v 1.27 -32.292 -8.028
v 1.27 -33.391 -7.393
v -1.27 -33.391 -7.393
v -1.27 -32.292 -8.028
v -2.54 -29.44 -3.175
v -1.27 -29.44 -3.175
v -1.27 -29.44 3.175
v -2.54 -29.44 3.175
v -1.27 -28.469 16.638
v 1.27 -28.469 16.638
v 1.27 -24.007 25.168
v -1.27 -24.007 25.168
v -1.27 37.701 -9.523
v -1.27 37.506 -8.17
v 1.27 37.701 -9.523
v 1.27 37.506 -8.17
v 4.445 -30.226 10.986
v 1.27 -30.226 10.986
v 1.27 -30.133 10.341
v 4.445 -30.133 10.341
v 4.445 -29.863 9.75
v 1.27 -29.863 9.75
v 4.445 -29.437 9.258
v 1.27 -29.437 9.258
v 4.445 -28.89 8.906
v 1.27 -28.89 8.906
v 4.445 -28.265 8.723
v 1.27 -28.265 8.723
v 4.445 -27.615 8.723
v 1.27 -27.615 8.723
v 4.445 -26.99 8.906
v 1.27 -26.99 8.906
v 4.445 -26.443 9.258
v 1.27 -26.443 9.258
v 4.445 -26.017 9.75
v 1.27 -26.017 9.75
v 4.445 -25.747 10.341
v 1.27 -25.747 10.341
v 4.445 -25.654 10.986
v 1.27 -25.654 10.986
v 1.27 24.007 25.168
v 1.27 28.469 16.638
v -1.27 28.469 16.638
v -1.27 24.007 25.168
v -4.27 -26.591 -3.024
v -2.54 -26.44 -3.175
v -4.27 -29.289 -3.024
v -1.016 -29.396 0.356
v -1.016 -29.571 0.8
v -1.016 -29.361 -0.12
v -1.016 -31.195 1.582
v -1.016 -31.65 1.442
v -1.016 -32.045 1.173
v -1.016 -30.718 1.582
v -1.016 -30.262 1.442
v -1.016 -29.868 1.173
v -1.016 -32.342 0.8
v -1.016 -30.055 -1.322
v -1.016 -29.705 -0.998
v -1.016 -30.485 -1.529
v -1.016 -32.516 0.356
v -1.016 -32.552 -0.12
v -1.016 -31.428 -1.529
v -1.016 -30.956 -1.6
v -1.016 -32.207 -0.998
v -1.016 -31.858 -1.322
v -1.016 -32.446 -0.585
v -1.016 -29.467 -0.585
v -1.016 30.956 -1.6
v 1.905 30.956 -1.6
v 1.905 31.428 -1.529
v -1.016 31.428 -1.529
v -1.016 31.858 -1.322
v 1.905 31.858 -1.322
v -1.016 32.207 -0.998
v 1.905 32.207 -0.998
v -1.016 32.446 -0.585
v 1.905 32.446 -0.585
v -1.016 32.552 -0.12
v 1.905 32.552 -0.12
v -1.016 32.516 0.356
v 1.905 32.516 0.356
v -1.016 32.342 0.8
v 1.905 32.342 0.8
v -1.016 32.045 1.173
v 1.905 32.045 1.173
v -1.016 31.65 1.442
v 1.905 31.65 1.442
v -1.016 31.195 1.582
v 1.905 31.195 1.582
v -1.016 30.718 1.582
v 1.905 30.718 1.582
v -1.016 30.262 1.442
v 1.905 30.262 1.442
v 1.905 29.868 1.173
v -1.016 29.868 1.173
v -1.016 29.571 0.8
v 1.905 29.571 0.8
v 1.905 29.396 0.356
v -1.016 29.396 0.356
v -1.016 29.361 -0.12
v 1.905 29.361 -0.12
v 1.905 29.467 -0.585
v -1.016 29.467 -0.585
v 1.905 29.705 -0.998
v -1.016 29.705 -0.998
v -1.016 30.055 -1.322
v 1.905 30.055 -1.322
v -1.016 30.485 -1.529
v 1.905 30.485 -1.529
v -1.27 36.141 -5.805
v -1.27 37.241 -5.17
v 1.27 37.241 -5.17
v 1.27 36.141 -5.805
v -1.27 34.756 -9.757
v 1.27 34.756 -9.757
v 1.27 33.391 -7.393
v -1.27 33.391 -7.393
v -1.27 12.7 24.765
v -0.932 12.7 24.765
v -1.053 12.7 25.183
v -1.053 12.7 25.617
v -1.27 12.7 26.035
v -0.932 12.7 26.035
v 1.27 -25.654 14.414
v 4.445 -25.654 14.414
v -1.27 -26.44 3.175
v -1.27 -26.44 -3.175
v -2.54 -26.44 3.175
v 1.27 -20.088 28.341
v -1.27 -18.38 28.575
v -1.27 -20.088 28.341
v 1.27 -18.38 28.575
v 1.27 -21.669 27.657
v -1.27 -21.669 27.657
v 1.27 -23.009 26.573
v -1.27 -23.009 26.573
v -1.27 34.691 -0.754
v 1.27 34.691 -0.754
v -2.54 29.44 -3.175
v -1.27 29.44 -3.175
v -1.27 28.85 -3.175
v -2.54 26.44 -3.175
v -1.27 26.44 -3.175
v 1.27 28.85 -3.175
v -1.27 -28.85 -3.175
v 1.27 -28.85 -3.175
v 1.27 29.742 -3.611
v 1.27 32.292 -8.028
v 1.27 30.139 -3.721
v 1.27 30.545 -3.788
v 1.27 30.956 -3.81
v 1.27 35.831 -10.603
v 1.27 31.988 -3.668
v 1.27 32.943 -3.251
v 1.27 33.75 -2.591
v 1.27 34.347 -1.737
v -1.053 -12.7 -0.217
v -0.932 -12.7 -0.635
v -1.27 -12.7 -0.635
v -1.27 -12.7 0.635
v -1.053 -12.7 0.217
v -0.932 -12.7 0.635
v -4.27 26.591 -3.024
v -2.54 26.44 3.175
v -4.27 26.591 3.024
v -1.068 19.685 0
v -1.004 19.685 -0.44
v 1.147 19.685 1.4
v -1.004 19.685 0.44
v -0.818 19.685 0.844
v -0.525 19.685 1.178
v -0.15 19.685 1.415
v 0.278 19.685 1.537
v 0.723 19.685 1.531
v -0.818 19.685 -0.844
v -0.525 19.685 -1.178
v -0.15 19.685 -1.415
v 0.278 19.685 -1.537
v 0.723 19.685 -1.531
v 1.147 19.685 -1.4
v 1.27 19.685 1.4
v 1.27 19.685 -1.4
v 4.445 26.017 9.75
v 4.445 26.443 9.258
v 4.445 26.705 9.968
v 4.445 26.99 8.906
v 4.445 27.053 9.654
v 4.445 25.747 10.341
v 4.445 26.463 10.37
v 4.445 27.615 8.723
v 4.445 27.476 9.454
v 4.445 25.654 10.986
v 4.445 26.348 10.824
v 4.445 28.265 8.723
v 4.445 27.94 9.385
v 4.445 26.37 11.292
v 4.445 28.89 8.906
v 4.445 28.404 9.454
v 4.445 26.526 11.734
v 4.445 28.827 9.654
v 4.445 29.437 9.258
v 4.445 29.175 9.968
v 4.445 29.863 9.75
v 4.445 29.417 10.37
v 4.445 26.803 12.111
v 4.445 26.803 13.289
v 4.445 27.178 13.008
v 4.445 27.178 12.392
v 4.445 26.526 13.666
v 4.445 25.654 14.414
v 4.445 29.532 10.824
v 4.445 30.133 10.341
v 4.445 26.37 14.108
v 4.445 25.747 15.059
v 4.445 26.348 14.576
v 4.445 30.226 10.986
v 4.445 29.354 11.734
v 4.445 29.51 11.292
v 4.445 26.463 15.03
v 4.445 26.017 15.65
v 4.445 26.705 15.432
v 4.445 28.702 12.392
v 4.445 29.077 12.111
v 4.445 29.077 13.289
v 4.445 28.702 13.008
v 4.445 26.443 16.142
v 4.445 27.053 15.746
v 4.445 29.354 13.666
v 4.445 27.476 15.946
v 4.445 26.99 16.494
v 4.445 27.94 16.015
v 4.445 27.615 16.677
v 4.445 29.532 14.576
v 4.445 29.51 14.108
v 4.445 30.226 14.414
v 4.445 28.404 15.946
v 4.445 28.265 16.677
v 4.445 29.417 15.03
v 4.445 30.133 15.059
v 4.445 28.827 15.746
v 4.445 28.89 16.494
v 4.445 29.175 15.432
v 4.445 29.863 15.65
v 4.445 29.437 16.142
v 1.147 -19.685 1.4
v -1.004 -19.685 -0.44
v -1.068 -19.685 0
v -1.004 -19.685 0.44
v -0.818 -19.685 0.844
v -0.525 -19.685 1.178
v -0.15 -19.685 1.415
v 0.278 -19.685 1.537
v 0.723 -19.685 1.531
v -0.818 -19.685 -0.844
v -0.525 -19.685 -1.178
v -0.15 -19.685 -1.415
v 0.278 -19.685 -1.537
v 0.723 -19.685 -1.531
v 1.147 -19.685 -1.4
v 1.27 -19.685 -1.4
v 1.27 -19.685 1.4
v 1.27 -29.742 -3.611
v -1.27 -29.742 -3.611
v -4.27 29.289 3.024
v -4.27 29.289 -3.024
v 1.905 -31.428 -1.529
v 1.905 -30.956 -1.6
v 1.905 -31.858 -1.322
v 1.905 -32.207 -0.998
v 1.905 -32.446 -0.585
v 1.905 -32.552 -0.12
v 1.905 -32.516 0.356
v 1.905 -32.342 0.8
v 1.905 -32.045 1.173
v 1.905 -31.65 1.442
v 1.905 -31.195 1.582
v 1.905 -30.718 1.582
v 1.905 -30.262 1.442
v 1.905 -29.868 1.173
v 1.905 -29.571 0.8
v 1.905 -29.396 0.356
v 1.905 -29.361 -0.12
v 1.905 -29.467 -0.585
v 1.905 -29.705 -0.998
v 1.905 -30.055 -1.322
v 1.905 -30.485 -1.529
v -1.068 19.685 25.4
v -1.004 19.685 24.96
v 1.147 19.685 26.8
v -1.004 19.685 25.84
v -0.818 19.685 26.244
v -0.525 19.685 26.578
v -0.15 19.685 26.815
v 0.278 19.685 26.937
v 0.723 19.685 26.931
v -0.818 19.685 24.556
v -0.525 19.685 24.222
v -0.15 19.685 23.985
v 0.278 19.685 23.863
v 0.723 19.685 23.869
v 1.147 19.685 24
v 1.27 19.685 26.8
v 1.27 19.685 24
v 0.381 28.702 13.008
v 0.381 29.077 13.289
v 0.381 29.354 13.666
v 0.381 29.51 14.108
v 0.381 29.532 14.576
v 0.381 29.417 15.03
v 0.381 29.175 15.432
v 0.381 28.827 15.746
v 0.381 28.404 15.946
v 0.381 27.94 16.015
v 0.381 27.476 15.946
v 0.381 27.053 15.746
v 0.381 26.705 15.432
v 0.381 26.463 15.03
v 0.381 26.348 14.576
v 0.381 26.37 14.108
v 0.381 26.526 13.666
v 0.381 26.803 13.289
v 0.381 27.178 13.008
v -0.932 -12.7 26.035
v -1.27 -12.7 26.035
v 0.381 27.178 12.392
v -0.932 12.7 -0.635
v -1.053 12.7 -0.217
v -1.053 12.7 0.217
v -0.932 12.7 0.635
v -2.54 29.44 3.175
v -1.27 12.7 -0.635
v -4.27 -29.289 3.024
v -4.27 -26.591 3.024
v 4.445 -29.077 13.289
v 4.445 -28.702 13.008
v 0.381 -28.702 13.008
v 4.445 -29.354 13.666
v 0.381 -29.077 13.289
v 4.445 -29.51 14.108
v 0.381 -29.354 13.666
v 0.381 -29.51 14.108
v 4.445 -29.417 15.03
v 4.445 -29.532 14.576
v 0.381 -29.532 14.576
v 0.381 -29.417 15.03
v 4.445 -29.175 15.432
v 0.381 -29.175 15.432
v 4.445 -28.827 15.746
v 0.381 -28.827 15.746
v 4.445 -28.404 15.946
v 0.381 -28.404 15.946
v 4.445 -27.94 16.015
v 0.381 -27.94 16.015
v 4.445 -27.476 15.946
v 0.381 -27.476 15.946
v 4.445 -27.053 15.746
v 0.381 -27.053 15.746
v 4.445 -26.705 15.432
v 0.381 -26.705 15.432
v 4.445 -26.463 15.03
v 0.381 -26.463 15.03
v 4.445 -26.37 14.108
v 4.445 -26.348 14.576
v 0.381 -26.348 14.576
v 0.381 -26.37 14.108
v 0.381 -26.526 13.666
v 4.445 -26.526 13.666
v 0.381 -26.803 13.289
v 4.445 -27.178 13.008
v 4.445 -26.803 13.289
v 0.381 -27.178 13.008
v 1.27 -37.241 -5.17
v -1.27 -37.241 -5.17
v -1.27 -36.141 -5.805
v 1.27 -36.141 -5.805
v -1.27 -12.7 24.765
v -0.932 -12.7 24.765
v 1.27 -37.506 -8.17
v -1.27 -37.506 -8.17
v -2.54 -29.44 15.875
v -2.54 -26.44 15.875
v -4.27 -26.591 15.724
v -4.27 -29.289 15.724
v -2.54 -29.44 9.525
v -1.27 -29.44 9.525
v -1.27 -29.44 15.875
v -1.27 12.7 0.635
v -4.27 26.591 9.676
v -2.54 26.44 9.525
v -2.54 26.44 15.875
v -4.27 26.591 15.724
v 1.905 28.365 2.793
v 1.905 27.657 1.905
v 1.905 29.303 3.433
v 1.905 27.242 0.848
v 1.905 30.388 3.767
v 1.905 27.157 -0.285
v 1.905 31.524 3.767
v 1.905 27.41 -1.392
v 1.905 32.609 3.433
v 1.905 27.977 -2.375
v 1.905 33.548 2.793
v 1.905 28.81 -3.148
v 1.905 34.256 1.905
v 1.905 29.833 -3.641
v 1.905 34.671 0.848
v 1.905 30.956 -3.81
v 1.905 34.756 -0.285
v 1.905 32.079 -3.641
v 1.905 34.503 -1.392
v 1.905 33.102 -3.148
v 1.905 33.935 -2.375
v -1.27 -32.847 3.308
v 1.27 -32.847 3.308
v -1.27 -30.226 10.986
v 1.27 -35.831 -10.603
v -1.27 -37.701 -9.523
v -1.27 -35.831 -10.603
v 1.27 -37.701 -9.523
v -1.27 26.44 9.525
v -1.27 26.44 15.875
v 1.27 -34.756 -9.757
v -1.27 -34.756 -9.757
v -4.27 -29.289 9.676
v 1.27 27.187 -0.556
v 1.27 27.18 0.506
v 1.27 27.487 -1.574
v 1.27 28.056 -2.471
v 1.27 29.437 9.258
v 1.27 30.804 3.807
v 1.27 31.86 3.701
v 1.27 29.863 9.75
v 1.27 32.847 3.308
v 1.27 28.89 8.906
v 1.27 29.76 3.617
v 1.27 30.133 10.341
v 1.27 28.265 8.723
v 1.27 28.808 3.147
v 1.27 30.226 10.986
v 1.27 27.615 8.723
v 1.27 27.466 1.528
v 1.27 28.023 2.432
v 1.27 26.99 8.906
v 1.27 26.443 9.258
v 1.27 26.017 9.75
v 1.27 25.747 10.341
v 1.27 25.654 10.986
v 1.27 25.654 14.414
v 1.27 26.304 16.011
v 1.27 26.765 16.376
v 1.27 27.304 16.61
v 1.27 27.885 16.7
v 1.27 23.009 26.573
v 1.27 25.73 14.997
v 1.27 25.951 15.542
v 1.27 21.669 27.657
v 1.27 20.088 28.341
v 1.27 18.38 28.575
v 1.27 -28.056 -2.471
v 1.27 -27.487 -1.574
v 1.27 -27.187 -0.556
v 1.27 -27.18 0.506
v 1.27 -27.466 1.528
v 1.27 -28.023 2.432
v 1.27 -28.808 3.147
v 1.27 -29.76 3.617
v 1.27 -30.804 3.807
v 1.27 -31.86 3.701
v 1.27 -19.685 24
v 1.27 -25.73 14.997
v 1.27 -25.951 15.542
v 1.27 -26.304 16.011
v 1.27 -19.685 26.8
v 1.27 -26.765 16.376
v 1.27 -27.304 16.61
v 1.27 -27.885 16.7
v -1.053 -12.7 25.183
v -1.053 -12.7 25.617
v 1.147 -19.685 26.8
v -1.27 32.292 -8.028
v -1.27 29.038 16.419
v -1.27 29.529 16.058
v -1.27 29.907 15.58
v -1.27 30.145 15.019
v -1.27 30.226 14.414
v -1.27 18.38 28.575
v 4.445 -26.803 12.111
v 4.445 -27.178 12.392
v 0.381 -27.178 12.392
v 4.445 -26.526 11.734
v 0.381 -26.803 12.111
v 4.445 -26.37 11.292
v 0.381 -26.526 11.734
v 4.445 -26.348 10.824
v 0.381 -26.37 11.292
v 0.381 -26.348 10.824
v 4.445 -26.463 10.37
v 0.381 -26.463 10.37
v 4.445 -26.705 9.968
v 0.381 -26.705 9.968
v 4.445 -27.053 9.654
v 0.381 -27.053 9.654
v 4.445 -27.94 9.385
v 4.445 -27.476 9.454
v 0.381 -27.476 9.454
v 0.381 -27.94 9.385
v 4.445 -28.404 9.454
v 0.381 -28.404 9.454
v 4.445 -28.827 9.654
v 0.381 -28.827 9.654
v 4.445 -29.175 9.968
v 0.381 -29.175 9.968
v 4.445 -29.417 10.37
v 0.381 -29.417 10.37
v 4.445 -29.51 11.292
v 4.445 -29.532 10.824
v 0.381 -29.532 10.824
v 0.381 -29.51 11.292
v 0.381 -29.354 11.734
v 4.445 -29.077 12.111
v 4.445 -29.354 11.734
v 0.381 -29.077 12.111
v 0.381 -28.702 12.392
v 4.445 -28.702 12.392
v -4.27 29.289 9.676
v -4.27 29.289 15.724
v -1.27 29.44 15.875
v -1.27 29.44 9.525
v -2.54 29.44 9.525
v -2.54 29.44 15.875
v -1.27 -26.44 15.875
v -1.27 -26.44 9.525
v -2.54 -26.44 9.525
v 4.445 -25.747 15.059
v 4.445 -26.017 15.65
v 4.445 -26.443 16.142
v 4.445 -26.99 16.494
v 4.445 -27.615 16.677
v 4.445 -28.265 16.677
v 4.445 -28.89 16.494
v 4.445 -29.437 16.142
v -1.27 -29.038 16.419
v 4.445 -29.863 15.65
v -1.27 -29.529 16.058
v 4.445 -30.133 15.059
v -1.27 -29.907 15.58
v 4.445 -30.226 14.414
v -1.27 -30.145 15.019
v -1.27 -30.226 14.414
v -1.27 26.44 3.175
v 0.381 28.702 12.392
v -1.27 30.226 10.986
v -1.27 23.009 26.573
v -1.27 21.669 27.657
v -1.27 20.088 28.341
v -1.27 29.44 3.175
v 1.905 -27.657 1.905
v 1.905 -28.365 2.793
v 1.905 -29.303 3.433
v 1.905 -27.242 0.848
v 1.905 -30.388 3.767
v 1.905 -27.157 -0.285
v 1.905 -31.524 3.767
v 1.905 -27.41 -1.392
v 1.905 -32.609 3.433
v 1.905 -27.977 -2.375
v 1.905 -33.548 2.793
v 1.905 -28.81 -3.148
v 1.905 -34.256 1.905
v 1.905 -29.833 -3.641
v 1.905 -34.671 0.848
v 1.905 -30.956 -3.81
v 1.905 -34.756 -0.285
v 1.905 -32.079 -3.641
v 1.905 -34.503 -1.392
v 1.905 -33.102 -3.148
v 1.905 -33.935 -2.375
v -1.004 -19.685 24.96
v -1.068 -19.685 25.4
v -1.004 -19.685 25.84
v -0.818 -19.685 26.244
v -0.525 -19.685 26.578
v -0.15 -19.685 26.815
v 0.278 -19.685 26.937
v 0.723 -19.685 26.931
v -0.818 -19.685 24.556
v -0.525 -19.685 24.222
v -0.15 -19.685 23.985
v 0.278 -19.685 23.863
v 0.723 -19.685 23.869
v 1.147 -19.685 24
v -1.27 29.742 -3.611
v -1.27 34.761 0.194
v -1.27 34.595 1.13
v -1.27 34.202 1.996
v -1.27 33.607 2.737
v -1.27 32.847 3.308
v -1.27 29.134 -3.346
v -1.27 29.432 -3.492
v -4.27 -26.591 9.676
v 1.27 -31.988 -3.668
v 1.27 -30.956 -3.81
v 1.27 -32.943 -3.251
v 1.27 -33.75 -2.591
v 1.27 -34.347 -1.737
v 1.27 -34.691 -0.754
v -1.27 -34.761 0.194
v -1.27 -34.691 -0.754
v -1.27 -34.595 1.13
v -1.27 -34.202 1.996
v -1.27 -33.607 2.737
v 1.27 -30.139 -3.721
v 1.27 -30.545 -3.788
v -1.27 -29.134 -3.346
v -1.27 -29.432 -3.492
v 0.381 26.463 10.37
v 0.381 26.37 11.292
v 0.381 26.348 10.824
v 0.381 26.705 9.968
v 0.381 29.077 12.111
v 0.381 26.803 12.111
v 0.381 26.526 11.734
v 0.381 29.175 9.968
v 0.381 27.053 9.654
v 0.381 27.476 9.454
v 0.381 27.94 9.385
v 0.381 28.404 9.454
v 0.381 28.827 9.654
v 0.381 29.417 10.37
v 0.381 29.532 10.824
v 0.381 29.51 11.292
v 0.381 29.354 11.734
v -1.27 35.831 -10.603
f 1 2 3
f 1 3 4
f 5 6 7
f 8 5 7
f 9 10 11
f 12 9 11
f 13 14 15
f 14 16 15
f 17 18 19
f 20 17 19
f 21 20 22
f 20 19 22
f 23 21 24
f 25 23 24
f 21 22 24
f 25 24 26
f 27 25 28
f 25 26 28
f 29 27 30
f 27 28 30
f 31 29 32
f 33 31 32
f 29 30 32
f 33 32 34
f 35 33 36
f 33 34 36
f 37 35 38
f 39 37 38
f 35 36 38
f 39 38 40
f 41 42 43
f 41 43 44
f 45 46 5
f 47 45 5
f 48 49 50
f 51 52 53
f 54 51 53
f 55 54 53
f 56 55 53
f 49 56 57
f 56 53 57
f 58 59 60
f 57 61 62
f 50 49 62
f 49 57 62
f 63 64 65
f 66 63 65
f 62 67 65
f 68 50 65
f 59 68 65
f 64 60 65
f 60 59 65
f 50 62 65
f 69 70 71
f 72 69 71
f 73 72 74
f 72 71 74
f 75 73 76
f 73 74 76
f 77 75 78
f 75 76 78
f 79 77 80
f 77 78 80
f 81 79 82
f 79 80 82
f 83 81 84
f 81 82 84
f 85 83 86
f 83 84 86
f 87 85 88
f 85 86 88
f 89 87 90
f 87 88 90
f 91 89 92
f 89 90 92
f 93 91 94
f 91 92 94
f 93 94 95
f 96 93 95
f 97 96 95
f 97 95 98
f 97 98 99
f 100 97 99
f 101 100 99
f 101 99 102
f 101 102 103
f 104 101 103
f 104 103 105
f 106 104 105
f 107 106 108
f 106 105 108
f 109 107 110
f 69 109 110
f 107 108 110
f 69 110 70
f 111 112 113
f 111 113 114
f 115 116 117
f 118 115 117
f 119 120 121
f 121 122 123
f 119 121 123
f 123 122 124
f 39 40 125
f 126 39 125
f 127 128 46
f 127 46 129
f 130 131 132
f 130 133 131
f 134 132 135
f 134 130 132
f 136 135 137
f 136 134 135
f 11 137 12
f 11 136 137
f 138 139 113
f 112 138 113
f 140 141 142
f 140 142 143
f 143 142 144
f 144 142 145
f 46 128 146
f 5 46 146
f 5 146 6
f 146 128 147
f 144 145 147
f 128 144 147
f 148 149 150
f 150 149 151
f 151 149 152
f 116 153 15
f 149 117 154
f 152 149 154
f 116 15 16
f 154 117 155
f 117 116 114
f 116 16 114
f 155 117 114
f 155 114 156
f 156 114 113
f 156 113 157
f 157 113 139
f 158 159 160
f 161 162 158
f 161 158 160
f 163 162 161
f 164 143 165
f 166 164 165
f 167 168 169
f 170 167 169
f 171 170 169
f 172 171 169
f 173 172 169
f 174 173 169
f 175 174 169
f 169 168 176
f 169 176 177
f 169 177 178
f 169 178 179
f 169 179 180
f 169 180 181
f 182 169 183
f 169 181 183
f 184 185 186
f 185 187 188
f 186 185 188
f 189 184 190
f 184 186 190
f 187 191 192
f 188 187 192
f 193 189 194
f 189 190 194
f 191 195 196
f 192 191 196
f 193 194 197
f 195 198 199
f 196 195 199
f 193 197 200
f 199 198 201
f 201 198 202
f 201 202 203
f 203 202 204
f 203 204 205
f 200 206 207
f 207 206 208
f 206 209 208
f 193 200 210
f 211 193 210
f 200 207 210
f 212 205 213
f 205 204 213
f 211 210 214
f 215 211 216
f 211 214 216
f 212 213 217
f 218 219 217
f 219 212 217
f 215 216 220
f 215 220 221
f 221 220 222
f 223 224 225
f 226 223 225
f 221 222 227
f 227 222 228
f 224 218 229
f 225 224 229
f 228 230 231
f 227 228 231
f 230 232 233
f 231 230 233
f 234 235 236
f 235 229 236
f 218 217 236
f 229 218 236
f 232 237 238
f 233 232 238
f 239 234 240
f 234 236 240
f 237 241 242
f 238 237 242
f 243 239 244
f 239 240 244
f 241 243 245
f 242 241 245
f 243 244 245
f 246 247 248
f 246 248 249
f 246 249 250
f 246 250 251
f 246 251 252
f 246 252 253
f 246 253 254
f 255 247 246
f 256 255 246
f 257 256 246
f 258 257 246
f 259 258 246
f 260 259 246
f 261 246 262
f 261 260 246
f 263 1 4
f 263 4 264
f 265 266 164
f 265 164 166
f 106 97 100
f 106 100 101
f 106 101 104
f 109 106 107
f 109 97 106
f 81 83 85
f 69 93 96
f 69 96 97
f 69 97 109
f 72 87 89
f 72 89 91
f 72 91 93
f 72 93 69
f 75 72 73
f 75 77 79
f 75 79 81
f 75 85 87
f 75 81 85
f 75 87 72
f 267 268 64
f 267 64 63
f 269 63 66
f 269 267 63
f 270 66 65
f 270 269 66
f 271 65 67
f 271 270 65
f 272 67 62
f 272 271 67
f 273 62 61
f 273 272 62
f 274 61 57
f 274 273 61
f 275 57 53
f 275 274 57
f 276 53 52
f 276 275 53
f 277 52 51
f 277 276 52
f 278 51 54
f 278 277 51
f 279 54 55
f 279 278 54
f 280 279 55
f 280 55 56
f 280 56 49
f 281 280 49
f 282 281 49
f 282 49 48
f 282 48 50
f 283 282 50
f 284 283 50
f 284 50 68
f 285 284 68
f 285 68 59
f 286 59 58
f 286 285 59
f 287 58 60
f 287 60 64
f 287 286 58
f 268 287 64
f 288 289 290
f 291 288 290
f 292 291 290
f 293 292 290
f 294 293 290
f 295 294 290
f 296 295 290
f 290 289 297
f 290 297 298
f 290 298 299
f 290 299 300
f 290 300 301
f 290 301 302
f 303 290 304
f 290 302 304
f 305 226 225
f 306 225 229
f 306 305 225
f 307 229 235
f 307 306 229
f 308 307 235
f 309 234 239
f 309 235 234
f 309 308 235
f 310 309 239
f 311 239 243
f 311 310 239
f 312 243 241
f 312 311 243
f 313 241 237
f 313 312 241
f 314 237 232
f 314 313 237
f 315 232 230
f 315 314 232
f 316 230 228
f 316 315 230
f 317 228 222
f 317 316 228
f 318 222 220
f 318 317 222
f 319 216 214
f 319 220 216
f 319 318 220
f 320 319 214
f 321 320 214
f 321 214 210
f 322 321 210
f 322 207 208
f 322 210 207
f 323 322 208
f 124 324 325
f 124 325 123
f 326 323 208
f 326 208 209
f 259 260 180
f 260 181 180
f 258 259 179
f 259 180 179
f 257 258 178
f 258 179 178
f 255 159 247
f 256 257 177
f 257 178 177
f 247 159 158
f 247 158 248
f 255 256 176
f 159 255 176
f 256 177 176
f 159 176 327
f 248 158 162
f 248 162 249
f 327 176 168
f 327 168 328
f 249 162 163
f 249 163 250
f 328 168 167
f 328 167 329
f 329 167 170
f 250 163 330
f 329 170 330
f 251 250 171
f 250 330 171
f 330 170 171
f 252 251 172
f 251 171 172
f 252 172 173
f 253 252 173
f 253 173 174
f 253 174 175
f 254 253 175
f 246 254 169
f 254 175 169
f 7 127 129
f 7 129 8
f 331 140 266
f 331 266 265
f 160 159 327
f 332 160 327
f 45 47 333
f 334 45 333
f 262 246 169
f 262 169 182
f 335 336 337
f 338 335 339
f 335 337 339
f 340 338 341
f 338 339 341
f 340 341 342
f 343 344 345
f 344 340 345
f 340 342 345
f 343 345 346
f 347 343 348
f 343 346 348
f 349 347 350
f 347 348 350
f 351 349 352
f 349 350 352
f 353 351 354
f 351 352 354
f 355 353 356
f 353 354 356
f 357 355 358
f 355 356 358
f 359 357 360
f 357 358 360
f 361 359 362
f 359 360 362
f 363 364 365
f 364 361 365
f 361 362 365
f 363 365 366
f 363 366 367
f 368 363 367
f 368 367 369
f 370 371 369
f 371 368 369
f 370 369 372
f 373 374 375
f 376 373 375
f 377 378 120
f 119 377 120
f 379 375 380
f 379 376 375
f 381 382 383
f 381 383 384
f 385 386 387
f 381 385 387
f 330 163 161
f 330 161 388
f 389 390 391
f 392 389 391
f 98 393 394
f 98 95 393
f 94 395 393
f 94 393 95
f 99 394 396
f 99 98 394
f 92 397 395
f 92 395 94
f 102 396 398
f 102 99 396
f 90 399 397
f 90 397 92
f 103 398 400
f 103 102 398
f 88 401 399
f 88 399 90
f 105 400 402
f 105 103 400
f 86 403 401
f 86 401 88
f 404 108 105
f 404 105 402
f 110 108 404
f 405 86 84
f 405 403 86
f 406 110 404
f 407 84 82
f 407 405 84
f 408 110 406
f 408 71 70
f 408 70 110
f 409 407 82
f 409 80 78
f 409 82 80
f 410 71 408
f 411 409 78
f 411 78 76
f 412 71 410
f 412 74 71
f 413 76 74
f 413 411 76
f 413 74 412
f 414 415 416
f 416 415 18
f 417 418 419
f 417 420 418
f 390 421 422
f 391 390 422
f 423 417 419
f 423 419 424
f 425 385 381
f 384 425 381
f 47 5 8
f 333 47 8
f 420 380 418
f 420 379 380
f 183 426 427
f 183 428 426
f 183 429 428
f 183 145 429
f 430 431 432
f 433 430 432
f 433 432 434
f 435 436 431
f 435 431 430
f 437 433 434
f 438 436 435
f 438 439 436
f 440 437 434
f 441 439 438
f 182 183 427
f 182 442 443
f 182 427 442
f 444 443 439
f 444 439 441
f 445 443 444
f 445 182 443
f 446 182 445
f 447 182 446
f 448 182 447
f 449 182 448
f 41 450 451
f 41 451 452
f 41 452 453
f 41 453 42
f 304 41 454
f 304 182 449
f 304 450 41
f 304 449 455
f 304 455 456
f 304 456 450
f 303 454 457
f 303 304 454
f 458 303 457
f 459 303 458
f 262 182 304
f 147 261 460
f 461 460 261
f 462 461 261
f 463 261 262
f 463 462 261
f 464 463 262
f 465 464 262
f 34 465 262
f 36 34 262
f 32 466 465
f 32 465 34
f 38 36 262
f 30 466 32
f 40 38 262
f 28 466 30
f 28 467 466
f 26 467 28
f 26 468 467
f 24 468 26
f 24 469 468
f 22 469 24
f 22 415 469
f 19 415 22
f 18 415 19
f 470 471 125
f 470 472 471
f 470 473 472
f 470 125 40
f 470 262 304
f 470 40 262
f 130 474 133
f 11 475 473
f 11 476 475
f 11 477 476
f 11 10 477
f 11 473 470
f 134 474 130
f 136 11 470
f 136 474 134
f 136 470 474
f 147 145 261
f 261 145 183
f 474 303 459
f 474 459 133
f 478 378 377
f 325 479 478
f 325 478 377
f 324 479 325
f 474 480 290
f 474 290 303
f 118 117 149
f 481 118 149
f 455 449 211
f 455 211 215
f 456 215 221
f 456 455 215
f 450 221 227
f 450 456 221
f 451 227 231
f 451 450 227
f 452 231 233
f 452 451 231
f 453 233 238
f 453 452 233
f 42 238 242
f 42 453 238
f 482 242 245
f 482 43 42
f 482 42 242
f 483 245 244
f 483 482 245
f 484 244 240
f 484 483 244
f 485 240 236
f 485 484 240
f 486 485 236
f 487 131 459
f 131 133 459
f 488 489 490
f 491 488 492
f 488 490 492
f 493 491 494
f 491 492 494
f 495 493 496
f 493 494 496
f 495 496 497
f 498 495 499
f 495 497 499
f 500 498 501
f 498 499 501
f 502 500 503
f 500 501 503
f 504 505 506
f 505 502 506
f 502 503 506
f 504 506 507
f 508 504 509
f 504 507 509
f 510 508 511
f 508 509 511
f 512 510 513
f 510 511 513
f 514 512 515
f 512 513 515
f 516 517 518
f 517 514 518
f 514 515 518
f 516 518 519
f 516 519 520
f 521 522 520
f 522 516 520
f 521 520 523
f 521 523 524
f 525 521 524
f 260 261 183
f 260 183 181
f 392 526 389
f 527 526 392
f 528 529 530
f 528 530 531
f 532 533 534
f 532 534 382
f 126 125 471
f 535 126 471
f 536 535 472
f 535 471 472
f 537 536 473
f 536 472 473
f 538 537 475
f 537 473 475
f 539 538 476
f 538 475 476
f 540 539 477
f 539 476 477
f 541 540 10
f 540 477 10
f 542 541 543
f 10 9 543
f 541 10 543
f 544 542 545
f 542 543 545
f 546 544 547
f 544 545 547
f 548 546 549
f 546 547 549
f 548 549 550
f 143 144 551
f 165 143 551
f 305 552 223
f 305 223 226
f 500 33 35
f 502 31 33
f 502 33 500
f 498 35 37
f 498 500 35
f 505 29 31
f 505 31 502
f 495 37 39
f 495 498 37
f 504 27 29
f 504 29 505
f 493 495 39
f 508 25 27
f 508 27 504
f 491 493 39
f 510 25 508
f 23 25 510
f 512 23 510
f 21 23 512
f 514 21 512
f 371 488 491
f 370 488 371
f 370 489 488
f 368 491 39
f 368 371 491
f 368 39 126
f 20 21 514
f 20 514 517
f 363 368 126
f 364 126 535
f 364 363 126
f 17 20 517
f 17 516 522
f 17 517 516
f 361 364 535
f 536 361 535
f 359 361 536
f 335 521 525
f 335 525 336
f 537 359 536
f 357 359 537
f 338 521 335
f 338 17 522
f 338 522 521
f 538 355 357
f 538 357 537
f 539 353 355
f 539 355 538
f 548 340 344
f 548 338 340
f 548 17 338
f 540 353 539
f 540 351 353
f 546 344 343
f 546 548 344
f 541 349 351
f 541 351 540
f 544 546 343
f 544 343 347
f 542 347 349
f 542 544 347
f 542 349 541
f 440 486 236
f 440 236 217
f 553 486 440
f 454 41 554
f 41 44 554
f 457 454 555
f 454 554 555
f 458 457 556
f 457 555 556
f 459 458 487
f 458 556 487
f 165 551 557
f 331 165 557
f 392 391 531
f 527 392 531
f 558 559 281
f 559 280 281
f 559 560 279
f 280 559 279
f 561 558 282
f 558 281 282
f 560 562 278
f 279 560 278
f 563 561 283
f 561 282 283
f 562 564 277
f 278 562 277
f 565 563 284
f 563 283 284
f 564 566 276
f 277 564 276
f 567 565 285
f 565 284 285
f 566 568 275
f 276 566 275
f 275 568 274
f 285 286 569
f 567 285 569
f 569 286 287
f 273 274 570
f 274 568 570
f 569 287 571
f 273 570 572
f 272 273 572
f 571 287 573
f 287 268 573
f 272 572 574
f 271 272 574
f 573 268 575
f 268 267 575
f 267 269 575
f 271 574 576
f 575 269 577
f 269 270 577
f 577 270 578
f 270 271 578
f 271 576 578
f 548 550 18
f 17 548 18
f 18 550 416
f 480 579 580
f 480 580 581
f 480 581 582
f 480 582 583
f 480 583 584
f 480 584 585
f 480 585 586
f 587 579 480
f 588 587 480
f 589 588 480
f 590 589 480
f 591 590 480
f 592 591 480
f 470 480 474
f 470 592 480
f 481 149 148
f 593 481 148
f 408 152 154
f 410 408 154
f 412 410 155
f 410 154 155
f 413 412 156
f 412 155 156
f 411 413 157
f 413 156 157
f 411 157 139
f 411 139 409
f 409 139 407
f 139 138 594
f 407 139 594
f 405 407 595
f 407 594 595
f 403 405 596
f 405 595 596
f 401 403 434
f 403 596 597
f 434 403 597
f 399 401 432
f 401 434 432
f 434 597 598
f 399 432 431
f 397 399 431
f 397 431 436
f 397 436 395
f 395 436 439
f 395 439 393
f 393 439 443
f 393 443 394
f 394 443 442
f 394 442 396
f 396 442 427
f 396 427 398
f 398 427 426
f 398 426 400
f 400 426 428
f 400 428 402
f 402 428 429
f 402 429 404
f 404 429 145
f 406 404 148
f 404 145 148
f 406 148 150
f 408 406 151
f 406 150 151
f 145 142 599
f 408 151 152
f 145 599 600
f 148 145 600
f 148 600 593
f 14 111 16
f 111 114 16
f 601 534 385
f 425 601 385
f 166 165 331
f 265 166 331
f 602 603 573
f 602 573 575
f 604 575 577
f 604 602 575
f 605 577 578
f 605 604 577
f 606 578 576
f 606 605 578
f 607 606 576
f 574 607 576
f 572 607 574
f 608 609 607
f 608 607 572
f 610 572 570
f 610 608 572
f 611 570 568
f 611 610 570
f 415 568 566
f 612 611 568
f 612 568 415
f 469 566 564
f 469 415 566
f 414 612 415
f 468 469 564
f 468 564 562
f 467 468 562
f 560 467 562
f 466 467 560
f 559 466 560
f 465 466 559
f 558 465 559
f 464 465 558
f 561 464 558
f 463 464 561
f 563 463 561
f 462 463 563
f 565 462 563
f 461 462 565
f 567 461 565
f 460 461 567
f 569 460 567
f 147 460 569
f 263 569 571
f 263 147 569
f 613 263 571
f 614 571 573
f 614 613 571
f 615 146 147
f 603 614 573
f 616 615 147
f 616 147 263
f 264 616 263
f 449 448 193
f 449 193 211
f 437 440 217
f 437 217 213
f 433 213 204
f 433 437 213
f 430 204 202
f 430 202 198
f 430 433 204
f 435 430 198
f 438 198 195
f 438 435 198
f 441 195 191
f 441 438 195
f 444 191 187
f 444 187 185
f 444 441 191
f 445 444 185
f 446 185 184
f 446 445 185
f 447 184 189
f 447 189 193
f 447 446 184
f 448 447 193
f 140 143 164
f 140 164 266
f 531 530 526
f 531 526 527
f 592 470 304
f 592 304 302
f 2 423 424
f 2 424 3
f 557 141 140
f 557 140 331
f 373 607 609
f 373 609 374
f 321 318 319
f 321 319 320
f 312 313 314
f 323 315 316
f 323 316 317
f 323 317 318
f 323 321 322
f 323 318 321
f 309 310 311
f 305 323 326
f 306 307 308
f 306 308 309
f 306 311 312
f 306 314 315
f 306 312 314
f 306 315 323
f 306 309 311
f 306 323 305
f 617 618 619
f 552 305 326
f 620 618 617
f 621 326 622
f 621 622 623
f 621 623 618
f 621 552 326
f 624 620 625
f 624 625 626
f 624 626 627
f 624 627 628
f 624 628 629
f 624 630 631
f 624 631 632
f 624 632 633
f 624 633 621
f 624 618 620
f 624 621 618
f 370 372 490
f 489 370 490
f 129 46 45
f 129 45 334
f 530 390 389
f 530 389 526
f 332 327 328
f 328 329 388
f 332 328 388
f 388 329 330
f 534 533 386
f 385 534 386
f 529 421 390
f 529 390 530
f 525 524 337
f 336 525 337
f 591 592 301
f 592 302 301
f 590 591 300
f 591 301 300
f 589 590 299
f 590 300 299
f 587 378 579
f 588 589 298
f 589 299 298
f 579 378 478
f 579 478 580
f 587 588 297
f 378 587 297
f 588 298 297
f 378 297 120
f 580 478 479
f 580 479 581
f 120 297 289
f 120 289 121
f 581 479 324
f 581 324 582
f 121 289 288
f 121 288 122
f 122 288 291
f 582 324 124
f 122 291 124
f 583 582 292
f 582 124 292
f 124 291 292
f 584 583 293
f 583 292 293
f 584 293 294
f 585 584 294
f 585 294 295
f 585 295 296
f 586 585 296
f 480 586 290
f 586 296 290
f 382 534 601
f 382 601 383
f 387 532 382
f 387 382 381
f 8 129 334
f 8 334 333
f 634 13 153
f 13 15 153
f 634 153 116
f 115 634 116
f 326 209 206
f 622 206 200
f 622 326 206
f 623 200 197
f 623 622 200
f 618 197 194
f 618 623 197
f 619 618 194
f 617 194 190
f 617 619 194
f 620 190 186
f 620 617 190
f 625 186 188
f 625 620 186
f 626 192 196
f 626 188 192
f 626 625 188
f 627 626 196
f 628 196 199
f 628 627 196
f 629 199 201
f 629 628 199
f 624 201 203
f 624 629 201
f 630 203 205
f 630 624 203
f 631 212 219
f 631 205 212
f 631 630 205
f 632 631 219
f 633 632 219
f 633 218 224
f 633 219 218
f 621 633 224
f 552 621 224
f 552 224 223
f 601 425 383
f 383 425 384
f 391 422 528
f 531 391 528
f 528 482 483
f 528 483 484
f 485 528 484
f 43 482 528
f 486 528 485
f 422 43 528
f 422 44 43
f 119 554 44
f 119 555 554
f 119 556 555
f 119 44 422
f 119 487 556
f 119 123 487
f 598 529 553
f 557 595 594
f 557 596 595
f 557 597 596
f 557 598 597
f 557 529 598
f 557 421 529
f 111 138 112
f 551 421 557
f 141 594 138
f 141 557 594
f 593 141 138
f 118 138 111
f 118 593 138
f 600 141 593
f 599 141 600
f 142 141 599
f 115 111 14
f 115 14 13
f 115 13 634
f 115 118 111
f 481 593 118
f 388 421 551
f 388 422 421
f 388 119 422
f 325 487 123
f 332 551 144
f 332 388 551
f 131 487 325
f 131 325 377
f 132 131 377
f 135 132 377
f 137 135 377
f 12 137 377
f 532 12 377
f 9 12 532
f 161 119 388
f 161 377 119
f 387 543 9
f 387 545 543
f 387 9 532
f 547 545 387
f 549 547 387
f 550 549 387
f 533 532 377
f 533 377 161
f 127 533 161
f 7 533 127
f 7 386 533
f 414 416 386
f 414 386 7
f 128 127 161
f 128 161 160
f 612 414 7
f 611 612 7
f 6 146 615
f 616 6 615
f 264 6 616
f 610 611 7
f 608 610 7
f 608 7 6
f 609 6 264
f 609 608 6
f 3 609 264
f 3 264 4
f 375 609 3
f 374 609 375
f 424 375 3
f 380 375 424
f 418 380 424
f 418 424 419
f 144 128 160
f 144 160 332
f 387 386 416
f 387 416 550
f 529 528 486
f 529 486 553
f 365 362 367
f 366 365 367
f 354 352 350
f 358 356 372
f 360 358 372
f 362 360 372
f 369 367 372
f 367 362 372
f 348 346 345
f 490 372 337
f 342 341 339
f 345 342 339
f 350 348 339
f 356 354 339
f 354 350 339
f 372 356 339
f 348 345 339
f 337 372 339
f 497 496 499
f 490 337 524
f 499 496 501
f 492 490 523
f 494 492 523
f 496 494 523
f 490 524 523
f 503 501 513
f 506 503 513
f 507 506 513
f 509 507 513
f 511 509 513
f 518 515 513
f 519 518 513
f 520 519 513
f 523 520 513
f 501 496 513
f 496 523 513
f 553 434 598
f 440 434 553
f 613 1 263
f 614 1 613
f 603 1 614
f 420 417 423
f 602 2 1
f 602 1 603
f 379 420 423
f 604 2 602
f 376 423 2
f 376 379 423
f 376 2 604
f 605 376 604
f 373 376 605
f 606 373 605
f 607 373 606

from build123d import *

# Parameters (mm, degrees)
DOWELSUPPORT_DEPTH          = 1.905
DOWELSUPPORT_DEPTH_BACK     = 1.27
SKETCH3_R                   = 3.81
SKETCH5_W                   = 6.35
SKETCH5_H                   = 44.45
SLIDERDOWELSUPPORT_DEPTH    = 1.27
SKETCH17_R                  = 1.549999948
CUT_EXTRUDE1_DEPTH          = 19.685
CUT_EXTRUDE2_DEPTH          = 36.118212712
CUT_EXTRUDE2_DEPTH_BACK     = 36.118212712
SKETCH18_W                  = 1.27
SKETCH18_H                  = 25.4
LPATTERN1_COUNT             = 2
LPATTERN1_PITCH             = 25.4
LATERALSUPPORT_DEPTH        = 1.27
SKETCH8_W                   = 6.35
SKETCH8_H                   = 3
TABSUPPORT_DEPTH            = 1.27
STRINGDOWELSUPPORT_START    = -1.27
STRINGDOWELSUPPORT_DEPTH    = 5.715
INTERSUPPORT_DEPTH          = 1.27
SKETCH10_W                  = 6.35
SKETCH10_H                  = 3
TABBASE_DEPTH               = 1.27
SKETCH12_W                  = 6.35
SKETCH12_H                  = 3
TABDRAFT_DEPTH              = 1.73
TABDRAFT_DRAFT              = 5
TABDRAFT_PROFILE_2_DEPTH    = 1.73
TABDRAFT_PROFILE_2_DRAFT    = 5
STRINGDOWELHOLES_DEPTH      = 48.707819409
STRINGDOWELHOLES_DEPTH_BACK = 1.524
SKETCH14_R                  = 1.600000102
PULLEYDOWELHOLE_DEPTH       = 2.921
FILLET1_R                   = 6.35


with BuildPart() as part:
    # Sketch3 → DowelSupport (new, two sides: drawn at the far end of the back side and taken through both)
    with BuildSketch(Plane(origin=(0, 0, 0), x_dir=(0, 0, -1), z_dir=(1, 0, 0)).offset(-DOWELSUPPORT_DEPTH_BACK)):
        with Locations((0, 30.95625)):
            Circle(SKETCH3_R)
    extrude(amount=DOWELSUPPORT_DEPTH + DOWELSUPPORT_DEPTH_BACK)

    # Sketch8 → TabSupport (add, symmetric)
    with BuildSketch(Plane(origin=(0, 0, 0), x_dir=(0, 0, -1), z_dir=(1, 0, 0))):
        with Locations((0, 27.94)):
            Rectangle(SKETCH8_W, SKETCH8_H)
        with Locations((-12.7, 27.94)):
            Rectangle(SKETCH8_W, SKETCH8_H)
    extrude(amount=TABSUPPORT_DEPTH, both=True)


with BuildPart() as body_2:
    # Sketch5 → SliderDowelSupport (new, symmetric)
    with BuildSketch(Plane(origin=(0, 0, 0), x_dir=(0, 0, -1), z_dir=(1, 0, 0))):
        Rectangle(SKETCH5_W, SKETCH5_H)
    extrude(amount=SLIDERDOWELSUPPORT_DEPTH, both=True)

    # Sketch17 → Cut-Extrude1 (cut, symmetric)
    with BuildSketch(Plane(origin=(0, 0, 0), x_dir=(1, 0, 0), z_dir=(0, 1, 0))):
        with Locations((0.482000052, 0)):
            Circle(SKETCH17_R)
        with BuildLine():
            Line((2.032, 0), (2.032, 1.399999994))
            Line((2.032, 1.399999994), (1.147206678, 1.399999994))
            ThreePointArc((1.147206678, 1.399999994), (1.792261491, 0.828078983), (2.032, 0))
        make_face()
        with BuildLine():
            Line((2.032, -1.399999994), (2.032, 0))
            ThreePointArc((2.032, 0), (1.792261491, -0.828078983), (1.147206678, -1.399999994))
            Line((1.147206678, -1.399999994), (2.032, -1.399999994))
        make_face()
    extrude(amount=CUT_EXTRUDE1_DEPTH, both=True, mode=Mode.SUBTRACT)

    # Sketch18 → Cut-Extrude2 (cut, two sides: drawn at the far end of the back side and taken through both)
    with BuildSketch(Plane.ZY.offset(1.27).offset(-CUT_EXTRUDE2_DEPTH_BACK)):
        Rectangle(SKETCH18_W, SKETCH18_H)
    extrude(amount=CUT_EXTRUDE2_DEPTH + CUT_EXTRUDE2_DEPTH_BACK, mode=Mode.SUBTRACT)


with BuildPart() as lpattern1_1:
    # LPattern1: pattern copy
    add(body_2.part.moved(Location(Vector(0, 0, 1) * (1 * LPATTERN1_PITCH))))


with BuildPart() as body_4:
    # Sketch6 → LateralSupport (new, symmetric)
    with BuildSketch(Plane(origin=(0, 0, 0), x_dir=(0, 0, -1), z_dir=(1, 0, 0))):
        Polygon((7.392863577, 33.391434671), (5.805363577, 36.141065329), (8.169612929, 37.506065329), (9.523465192, 37.701124423), (10.602965192, 35.831375577), (9.757112929, 34.756434671), align=None)
    extrude(amount=LATERALSUPPORT_DEPTH, both=True)


with BuildPart() as tabsupport_piece_1:
    # of the separate pieces the step leaves, piece 1, a body of its own (tabsupport_pieces)
    add(part.part.solids().sort_by_distance((0, 30.95625, -3.81))[0])


with BuildPart() as tabsupport_piece_2:
    # of the separate pieces the step leaves, piece 2, a body of its own (tabsupport_pieces)
    add(part.part.solids().sort_by_distance((-1.27, 26.44, 9.525))[0])

    # Sketch15 → StringDowelSupport (add)
    with BuildSketch(Plane(origin=(0, 0, 0), x_dir=(0, 0, -1), z_dir=(1, 0, 0)).offset(STRINGDOWELSUPPORT_START)):
        with BuildLine():
            Line((-14.4145, 30.226), (-10.9855, 30.226))
            ThreePointArc((-10.9855, 30.226), (-8.6995, 27.94), (-10.9855, 25.654))
            Line((-10.9855, 25.654), (-14.4145, 25.654))
            ThreePointArc((-14.4145, 25.654), (-16.7005, 27.94), (-14.4145, 30.226))
        make_face()
    extrude(amount=STRINGDOWELSUPPORT_DEPTH)


with BuildPart() as body_2_1:
    add(body_2.part)

    add(lpattern1_1.part)  # InterSupport merges LPattern1_1

    add(body_4.part)  # InterSupport merges body 4

    add(tabsupport_piece_1.part)  # InterSupport merges TabSupport piece 1

    add(tabsupport_piece_2.part)  # InterSupport merges TabSupport piece 2
    # Sketch7 → InterSupport (add, symmetric)
    with BuildSketch(Plane(origin=(0, 0, 0), x_dir=(0, 0, -1), z_dir=(1, 0, 0))):
        Polygon((5.170363577, 37.240917591), (8.027863577, 32.291582409), (1.42875, 28.481582409), (-1.42875, 33.430917591), align=None)
        Polygon((-3.175, 15.875), (-3.175, 22.225), (3.175, 22.225), (3.175, 26.44), (0.923046602, 28.251940251), (-0.923046602, 33.660559749), (-10.9855, 30.226), (-14.4145, 30.226), (-15.109807039, 29.269115541), (-28.575, 22.225), (-22.225, 22.225), (-22.225, 0), (-3.175, 0), align=None)
    extrude(amount=INTERSUPPORT_DEPTH, both=True)

    # Sketch10 → TabBase (add)
    with BuildSketch(Plane.ZY.offset(1.27)):
        with Locations((0, 27.94)):
            Rectangle(SKETCH10_W, SKETCH10_H)
        with Locations((12.7, 27.94)):
            Rectangle(SKETCH10_W, SKETCH10_H)
    extrude(amount=TABBASE_DEPTH)


with BuildPart() as tabdraft_tool:
    # Sketch12 → TabDraft (with draft: the straight prism first)
    with BuildSketch(Plane.ZY.offset(2.54)):
        with Locations((0, 27.94)):
            Rectangle(SKETCH12_W, SKETCH12_H)
    extrude(amount=TABDRAFT_DEPTH)
    # TabDraft: the draft: its side faces are tilted about the plane it starts from
    tabdraft_sides = [tabdraft_tool.faces().sort_by_distance(p)[0] for p in [
        (-3.405, 27.94, 3.175),
        (-3.405, 29.44, 0),
        (-3.405, 27.94, -3.175),
        (-3.405, 26.44, 0),
    ]]
    draft(tabdraft_sides, Plane.ZY.offset(2.54), TABDRAFT_DRAFT)


with BuildPart() as body_2_2:
    add(body_2_1.part)

    # TabDraft: add tabdraft_tool
    add(tabdraft_tool.part)


with BuildPart() as tabdraft_profile_2_tool:
    # Sketch12 → TabDraft profile 2 (with draft: the straight prism first)
    with BuildSketch(Plane.ZY.offset(2.54)):
        with Locations((12.7, 27.94)):
            Rectangle(SKETCH12_W, SKETCH12_H)
    extrude(amount=TABDRAFT_PROFILE_2_DEPTH)
    # TabDraft profile 2: the draft: its side faces are tilted about the plane it starts from
    tabdraft_profile_2_sides = [tabdraft_profile_2_tool.faces().sort_by_distance(p)[0] for p in [
        (-3.405, 27.94, 9.525),
        (-3.405, 26.44, 12.7),
        (-3.405, 27.94, 15.875),
        (-3.405, 29.44, 12.7),
    ]]
    draft(tabdraft_profile_2_sides, Plane.ZY.offset(2.54), TABDRAFT_PROFILE_2_DRAFT)


with BuildPart() as body_2_3:
    add(body_2_2.part)

    # TabDraft profile 2: add tabdraft_profile_2_tool
    add(tabdraft_profile_2_tool.part)

    # Sketch16 → StringDowelHoles (cut, two sides: drawn at the far end of the back side and taken through both)
    with BuildSketch(Plane(origin=(1.905, 0, 0), x_dir=(0, 0, -1), z_dir=(1, 0, 0)).offset(-STRINGDOWELHOLES_DEPTH_BACK)):
        with BuildLine():
            Line((-13.00760401, 27.178), (-12.39239599, 27.178))
            ThreePointArc((-12.39239599, 27.178), (-9.385499898, 27.94), (-12.39239599, 28.702))
            Line((-12.39239599, 28.702), (-13.00760401, 28.702))
            ThreePointArc((-13.00760401, 28.702), (-16.014500102, 27.94), (-13.00760401, 27.178))
        make_face()
    extrude(amount=STRINGDOWELHOLES_DEPTH + STRINGDOWELHOLES_DEPTH_BACK, mode=Mode.SUBTRACT)

    # Sketch14 → PulleyDowelHole (cut)
    with BuildSketch(Plane(origin=(1.905, 0, 0), x_dir=(0, 0, -1), z_dir=(1, 0, 0))):
        with Locations((0, 30.95625)):
            Circle(SKETCH14_R)
    extrude(amount=-PULLEYDOWELHOLE_DEPTH, mode=Mode.SUBTRACT)

    # Mirror1: body 2 across plane


with BuildPart() as body_2_4:
    add(body_2_3.part)
    add(body_2_3.part.mirror(Plane.ZX))

    # Fillet1
    fillet1_edges = [body_2_4.edges().sort_by_distance(p)[0] for p in [
        (0, -22.225, 28.575),
        (0, 22.225, 28.575),
    ]]
    fillet(fillet1_edges, radius=FILLET1_R)


solid = body_2_4.part
